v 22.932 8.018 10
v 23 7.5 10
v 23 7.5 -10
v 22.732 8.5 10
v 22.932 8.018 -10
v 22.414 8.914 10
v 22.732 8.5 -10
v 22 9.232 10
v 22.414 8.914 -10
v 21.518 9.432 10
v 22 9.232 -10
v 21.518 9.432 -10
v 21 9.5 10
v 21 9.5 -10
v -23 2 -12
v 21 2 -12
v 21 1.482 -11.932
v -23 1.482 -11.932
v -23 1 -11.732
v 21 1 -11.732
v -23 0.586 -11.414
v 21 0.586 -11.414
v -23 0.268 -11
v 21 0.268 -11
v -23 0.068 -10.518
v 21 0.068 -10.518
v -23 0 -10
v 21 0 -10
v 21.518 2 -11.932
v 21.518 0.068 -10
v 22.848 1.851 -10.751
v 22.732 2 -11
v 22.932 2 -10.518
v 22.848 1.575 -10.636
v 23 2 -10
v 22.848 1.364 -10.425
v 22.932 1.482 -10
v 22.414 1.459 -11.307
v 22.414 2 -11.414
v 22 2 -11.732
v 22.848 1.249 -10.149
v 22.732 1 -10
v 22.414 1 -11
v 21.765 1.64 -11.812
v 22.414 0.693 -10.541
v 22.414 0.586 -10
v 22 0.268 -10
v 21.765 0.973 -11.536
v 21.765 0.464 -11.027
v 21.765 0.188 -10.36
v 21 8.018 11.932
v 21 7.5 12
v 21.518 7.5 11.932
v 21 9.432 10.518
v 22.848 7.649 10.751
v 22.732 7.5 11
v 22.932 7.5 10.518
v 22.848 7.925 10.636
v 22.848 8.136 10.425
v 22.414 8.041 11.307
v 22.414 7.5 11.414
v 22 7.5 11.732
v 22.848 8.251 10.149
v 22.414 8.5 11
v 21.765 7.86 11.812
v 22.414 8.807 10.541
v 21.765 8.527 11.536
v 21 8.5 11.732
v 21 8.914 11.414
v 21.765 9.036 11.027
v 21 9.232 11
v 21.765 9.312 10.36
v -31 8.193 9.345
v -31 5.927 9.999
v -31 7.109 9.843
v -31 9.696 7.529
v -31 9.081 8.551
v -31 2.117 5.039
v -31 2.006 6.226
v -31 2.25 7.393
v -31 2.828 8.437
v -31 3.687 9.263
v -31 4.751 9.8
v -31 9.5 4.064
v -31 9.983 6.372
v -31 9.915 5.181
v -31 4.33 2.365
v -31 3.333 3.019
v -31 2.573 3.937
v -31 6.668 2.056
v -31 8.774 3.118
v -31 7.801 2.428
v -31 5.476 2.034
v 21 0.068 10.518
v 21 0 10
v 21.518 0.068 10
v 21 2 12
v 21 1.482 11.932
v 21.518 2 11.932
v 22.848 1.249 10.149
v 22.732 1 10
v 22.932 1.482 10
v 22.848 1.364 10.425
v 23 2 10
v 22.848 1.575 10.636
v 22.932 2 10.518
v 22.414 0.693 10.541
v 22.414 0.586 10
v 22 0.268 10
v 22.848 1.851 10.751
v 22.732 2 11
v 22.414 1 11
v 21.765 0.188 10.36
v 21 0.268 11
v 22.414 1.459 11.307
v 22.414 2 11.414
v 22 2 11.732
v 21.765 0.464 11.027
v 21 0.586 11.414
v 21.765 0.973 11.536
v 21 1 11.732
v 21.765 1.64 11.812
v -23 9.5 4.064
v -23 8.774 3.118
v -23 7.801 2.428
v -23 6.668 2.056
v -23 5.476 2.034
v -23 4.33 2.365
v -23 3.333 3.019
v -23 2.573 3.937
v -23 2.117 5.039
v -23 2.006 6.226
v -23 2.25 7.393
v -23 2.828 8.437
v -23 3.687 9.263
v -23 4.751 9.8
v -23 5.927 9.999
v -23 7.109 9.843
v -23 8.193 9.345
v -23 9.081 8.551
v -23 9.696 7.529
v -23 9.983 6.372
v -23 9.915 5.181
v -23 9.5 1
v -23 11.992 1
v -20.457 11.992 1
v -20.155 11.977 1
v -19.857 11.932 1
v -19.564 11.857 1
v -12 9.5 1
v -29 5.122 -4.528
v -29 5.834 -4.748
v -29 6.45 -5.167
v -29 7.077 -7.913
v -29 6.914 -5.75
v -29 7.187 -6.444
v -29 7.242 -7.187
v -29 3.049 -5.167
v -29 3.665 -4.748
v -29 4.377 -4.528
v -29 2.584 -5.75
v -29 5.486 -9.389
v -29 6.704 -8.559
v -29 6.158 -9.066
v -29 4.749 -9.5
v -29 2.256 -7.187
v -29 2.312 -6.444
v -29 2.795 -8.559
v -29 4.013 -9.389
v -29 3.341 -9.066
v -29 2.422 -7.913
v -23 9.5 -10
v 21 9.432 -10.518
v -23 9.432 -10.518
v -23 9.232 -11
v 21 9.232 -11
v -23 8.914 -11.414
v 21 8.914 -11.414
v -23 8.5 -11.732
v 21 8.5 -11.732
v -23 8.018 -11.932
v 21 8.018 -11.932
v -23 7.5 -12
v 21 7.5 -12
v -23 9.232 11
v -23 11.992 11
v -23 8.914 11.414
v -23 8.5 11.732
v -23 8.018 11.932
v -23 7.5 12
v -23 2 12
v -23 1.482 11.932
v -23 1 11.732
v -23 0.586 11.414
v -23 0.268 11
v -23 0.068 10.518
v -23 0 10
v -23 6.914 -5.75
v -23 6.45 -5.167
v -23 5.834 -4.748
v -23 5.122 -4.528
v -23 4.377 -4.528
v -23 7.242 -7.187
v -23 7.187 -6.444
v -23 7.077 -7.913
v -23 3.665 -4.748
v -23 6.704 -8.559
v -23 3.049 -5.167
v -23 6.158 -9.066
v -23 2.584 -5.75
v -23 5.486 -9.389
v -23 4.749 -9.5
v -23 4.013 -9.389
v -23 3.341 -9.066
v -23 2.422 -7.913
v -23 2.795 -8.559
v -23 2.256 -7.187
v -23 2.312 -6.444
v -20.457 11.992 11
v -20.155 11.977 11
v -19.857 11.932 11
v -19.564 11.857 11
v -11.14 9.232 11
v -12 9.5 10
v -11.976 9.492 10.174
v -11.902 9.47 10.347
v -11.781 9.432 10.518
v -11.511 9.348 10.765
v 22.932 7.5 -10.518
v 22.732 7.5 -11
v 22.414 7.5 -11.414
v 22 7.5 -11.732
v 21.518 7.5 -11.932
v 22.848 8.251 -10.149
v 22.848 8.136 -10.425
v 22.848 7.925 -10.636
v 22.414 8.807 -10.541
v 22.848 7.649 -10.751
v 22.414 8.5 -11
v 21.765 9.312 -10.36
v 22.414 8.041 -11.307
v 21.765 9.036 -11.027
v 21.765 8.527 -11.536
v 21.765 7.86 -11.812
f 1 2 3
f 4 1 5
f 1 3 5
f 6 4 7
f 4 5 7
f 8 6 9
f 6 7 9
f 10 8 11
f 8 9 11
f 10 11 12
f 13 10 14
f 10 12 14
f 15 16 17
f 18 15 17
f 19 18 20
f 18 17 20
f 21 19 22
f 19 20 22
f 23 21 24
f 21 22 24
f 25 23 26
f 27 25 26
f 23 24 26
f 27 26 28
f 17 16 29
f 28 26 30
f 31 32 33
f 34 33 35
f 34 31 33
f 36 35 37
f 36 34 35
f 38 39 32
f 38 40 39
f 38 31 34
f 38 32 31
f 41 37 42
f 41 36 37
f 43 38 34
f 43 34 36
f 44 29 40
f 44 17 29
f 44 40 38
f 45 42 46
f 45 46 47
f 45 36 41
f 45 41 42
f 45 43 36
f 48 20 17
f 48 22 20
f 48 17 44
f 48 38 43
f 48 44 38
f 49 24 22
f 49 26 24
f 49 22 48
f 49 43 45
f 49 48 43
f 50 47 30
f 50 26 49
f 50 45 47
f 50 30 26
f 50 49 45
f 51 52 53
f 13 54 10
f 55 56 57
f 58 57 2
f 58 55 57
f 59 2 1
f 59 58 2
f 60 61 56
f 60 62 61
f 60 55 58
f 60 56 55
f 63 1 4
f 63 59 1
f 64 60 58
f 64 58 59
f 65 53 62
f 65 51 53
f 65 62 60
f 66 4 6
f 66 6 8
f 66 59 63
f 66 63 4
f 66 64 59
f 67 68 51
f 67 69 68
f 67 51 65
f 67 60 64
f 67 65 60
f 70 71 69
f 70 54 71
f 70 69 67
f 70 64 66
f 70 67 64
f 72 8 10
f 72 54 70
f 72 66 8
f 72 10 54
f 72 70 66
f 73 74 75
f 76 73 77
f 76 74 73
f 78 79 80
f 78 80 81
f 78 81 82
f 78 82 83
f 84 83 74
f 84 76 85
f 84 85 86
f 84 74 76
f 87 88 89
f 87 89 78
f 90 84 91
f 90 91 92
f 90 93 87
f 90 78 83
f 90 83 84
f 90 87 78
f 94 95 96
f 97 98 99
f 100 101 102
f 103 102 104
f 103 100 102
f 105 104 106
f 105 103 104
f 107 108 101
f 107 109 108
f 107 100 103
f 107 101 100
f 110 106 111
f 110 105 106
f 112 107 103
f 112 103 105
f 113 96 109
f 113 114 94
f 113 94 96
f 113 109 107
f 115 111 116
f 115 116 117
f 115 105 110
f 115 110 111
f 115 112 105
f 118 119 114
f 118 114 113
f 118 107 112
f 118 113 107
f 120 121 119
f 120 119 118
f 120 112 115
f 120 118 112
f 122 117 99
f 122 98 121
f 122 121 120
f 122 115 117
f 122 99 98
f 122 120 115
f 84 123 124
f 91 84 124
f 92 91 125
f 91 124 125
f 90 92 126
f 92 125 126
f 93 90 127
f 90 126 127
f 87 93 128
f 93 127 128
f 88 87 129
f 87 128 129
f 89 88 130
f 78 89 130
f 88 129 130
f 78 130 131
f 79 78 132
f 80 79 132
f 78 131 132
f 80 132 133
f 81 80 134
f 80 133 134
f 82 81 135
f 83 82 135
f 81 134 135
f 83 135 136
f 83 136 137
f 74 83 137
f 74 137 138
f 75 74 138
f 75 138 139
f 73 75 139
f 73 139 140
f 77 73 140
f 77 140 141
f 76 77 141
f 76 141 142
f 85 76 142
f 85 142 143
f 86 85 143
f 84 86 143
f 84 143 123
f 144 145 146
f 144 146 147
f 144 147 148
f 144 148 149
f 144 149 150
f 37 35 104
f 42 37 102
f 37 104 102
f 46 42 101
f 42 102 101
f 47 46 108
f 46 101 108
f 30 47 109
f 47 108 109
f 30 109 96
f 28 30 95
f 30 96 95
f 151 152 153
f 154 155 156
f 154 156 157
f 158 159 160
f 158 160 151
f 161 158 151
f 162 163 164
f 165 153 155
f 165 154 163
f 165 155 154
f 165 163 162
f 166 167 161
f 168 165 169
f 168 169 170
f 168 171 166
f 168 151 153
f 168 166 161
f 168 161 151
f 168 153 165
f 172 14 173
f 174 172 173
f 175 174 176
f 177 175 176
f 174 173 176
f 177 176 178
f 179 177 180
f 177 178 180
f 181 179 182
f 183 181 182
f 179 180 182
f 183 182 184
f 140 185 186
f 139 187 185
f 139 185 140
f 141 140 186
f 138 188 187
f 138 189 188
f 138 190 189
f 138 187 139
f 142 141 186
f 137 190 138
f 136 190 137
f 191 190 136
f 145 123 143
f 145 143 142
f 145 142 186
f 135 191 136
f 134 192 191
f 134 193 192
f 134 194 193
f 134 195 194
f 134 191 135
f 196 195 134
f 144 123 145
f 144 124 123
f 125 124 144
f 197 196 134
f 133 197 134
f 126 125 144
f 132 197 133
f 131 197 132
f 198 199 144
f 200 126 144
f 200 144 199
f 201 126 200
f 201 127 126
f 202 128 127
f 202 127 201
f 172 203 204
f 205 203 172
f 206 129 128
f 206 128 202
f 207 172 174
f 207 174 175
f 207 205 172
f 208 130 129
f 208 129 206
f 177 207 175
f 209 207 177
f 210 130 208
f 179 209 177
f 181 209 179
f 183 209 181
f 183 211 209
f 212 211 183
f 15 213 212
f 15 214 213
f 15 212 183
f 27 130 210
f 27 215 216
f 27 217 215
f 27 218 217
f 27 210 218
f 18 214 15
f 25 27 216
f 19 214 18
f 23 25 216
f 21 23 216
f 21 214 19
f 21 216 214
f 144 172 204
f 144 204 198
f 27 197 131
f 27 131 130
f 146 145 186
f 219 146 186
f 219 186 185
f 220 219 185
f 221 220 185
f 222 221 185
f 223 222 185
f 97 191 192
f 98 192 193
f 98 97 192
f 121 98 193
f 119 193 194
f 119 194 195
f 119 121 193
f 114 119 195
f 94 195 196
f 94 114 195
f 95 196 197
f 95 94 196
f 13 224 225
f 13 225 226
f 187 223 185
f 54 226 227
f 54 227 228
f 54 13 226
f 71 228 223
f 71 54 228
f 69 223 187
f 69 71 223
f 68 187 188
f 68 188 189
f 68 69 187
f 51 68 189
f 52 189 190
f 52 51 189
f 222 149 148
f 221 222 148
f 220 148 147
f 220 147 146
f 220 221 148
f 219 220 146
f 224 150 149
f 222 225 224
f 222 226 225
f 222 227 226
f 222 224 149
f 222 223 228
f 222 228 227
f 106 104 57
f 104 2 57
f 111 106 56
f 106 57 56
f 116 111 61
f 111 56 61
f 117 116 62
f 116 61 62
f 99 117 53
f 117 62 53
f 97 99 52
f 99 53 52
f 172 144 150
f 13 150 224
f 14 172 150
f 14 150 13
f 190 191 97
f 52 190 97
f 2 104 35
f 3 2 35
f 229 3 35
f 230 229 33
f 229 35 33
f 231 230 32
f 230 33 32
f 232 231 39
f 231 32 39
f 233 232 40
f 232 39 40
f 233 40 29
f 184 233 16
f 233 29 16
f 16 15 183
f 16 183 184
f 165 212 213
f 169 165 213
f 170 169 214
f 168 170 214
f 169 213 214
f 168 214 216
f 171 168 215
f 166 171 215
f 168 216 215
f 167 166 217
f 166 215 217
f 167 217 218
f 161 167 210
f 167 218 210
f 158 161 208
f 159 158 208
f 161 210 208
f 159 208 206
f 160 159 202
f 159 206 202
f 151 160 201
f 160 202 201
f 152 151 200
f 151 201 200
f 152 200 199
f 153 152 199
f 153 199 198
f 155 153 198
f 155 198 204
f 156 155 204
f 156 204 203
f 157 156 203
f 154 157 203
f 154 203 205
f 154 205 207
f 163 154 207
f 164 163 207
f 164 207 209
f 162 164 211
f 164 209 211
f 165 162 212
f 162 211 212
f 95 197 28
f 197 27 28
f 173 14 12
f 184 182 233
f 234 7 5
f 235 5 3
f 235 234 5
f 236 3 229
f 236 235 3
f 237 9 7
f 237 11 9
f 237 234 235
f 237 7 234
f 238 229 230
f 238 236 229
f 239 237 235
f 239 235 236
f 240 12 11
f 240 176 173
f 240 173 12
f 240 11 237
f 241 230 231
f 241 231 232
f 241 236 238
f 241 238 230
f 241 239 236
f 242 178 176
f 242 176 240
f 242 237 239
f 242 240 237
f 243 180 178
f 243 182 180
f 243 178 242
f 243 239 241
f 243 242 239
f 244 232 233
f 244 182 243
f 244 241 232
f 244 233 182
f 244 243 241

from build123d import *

# Parameters (mm, degrees)
SKETCH_1_W      = 46
SKETCH_1_H      = 24
EXTRUDE_1_DEPTH = 9.5
SKETCH_2_R      = 4
EXTRUDE_2_DEPTH = 8
SKETCH_4_W      = 10
SKETCH_4_H      = 5.984936324
EXTRUDE_3_DEPTH = 3
EXTRUDE_4_DEPTH = 10
SKETCH_6_R      = 2.5
EXTRUDE_5_DEPTH = 6
FILLET_1_R      = 3
FILLET_5_R      = 2
FILLET_6_R      = 2


with BuildPart() as part:
    # 草图1 → 凸台-拉伸1 (new body)
    with BuildSketch(Plane(origin=(0, 0, 0), x_dir=(1, 0, 0), z_dir=(0, 1, 0))):
        Rectangle(SKETCH_1_W, SKETCH_1_H)
    extrude(amount=EXTRUDE_1_DEPTH)

    # 草图2 → 凸台-拉伸2 (add)
    with BuildSketch(Plane.ZY.offset(23)):
        with Locations(Location((6, 6, 0), (0, 0, 118.955024372))):
            Circle(SKETCH_2_R)
    extrude(amount=EXTRUDE_2_DEPTH)

    # 草图4 → 凸台-拉伸3 (add)
    with BuildSketch(Plane.ZY.offset(23)):
        with Locations((6, 9)):
            Rectangle(SKETCH_4_W, SKETCH_4_H)
    extrude(amount=-EXTRUDE_3_DEPTH)

    # 草图5 → 凸台-拉伸4 (add)
    with BuildSketch(Plane.XY.offset(11)):
        Polygon((-20, 11.992468162), (-20, 9.5), (-12, 9.5), align=None)
    extrude(amount=-EXTRUDE_4_DEPTH)

    # 草图6 → 凸台-拉伸5 (add)
    with BuildSketch(Plane.ZY.offset(23)):
        with Locations(Location((-7, 4.749394355, 0), (0, 0, 180))):
            Circle(SKETCH_6_R)
    extrude(amount=EXTRUDE_5_DEPTH)

    # 圆角1
    fillet_1_edges = [part.edges().sort_by_distance(p)[0] for p in [
        (-20, 11.992468162, 6),
    ]]
    fillet(fillet_1_edges, radius=FILLET_1_R)

    # 圆角5
    fillet_5_edges = [part.edges().sort_by_distance(p)[0] for p in [
        (0, 0, 12),
        (0, 0, -12),
        (0, 9.5, -12),
        (0, 9.5, 12),
    ]]
    fillet(fillet_5_edges, radius=FILLET_5_R)

    # 圆角6
    fillet_6_edges = [part.edges().sort_by_distance(p)[0] for p in [
        (23, 4.75, 12),
        (23, 0, 0),
        (23, 4.75, -12),
        (23, 9.5, 0),
        (23, 8.914213562, 11.414213562),
        (23, 8.914213562, -11.414213562),
        (23, 0.585786438, -11.414213562),
        (23, 0.585786438, 11.414213562),
    ]]
    fillet(fillet_6_edges, radius=FILLET_6_R)


solid = part.part
